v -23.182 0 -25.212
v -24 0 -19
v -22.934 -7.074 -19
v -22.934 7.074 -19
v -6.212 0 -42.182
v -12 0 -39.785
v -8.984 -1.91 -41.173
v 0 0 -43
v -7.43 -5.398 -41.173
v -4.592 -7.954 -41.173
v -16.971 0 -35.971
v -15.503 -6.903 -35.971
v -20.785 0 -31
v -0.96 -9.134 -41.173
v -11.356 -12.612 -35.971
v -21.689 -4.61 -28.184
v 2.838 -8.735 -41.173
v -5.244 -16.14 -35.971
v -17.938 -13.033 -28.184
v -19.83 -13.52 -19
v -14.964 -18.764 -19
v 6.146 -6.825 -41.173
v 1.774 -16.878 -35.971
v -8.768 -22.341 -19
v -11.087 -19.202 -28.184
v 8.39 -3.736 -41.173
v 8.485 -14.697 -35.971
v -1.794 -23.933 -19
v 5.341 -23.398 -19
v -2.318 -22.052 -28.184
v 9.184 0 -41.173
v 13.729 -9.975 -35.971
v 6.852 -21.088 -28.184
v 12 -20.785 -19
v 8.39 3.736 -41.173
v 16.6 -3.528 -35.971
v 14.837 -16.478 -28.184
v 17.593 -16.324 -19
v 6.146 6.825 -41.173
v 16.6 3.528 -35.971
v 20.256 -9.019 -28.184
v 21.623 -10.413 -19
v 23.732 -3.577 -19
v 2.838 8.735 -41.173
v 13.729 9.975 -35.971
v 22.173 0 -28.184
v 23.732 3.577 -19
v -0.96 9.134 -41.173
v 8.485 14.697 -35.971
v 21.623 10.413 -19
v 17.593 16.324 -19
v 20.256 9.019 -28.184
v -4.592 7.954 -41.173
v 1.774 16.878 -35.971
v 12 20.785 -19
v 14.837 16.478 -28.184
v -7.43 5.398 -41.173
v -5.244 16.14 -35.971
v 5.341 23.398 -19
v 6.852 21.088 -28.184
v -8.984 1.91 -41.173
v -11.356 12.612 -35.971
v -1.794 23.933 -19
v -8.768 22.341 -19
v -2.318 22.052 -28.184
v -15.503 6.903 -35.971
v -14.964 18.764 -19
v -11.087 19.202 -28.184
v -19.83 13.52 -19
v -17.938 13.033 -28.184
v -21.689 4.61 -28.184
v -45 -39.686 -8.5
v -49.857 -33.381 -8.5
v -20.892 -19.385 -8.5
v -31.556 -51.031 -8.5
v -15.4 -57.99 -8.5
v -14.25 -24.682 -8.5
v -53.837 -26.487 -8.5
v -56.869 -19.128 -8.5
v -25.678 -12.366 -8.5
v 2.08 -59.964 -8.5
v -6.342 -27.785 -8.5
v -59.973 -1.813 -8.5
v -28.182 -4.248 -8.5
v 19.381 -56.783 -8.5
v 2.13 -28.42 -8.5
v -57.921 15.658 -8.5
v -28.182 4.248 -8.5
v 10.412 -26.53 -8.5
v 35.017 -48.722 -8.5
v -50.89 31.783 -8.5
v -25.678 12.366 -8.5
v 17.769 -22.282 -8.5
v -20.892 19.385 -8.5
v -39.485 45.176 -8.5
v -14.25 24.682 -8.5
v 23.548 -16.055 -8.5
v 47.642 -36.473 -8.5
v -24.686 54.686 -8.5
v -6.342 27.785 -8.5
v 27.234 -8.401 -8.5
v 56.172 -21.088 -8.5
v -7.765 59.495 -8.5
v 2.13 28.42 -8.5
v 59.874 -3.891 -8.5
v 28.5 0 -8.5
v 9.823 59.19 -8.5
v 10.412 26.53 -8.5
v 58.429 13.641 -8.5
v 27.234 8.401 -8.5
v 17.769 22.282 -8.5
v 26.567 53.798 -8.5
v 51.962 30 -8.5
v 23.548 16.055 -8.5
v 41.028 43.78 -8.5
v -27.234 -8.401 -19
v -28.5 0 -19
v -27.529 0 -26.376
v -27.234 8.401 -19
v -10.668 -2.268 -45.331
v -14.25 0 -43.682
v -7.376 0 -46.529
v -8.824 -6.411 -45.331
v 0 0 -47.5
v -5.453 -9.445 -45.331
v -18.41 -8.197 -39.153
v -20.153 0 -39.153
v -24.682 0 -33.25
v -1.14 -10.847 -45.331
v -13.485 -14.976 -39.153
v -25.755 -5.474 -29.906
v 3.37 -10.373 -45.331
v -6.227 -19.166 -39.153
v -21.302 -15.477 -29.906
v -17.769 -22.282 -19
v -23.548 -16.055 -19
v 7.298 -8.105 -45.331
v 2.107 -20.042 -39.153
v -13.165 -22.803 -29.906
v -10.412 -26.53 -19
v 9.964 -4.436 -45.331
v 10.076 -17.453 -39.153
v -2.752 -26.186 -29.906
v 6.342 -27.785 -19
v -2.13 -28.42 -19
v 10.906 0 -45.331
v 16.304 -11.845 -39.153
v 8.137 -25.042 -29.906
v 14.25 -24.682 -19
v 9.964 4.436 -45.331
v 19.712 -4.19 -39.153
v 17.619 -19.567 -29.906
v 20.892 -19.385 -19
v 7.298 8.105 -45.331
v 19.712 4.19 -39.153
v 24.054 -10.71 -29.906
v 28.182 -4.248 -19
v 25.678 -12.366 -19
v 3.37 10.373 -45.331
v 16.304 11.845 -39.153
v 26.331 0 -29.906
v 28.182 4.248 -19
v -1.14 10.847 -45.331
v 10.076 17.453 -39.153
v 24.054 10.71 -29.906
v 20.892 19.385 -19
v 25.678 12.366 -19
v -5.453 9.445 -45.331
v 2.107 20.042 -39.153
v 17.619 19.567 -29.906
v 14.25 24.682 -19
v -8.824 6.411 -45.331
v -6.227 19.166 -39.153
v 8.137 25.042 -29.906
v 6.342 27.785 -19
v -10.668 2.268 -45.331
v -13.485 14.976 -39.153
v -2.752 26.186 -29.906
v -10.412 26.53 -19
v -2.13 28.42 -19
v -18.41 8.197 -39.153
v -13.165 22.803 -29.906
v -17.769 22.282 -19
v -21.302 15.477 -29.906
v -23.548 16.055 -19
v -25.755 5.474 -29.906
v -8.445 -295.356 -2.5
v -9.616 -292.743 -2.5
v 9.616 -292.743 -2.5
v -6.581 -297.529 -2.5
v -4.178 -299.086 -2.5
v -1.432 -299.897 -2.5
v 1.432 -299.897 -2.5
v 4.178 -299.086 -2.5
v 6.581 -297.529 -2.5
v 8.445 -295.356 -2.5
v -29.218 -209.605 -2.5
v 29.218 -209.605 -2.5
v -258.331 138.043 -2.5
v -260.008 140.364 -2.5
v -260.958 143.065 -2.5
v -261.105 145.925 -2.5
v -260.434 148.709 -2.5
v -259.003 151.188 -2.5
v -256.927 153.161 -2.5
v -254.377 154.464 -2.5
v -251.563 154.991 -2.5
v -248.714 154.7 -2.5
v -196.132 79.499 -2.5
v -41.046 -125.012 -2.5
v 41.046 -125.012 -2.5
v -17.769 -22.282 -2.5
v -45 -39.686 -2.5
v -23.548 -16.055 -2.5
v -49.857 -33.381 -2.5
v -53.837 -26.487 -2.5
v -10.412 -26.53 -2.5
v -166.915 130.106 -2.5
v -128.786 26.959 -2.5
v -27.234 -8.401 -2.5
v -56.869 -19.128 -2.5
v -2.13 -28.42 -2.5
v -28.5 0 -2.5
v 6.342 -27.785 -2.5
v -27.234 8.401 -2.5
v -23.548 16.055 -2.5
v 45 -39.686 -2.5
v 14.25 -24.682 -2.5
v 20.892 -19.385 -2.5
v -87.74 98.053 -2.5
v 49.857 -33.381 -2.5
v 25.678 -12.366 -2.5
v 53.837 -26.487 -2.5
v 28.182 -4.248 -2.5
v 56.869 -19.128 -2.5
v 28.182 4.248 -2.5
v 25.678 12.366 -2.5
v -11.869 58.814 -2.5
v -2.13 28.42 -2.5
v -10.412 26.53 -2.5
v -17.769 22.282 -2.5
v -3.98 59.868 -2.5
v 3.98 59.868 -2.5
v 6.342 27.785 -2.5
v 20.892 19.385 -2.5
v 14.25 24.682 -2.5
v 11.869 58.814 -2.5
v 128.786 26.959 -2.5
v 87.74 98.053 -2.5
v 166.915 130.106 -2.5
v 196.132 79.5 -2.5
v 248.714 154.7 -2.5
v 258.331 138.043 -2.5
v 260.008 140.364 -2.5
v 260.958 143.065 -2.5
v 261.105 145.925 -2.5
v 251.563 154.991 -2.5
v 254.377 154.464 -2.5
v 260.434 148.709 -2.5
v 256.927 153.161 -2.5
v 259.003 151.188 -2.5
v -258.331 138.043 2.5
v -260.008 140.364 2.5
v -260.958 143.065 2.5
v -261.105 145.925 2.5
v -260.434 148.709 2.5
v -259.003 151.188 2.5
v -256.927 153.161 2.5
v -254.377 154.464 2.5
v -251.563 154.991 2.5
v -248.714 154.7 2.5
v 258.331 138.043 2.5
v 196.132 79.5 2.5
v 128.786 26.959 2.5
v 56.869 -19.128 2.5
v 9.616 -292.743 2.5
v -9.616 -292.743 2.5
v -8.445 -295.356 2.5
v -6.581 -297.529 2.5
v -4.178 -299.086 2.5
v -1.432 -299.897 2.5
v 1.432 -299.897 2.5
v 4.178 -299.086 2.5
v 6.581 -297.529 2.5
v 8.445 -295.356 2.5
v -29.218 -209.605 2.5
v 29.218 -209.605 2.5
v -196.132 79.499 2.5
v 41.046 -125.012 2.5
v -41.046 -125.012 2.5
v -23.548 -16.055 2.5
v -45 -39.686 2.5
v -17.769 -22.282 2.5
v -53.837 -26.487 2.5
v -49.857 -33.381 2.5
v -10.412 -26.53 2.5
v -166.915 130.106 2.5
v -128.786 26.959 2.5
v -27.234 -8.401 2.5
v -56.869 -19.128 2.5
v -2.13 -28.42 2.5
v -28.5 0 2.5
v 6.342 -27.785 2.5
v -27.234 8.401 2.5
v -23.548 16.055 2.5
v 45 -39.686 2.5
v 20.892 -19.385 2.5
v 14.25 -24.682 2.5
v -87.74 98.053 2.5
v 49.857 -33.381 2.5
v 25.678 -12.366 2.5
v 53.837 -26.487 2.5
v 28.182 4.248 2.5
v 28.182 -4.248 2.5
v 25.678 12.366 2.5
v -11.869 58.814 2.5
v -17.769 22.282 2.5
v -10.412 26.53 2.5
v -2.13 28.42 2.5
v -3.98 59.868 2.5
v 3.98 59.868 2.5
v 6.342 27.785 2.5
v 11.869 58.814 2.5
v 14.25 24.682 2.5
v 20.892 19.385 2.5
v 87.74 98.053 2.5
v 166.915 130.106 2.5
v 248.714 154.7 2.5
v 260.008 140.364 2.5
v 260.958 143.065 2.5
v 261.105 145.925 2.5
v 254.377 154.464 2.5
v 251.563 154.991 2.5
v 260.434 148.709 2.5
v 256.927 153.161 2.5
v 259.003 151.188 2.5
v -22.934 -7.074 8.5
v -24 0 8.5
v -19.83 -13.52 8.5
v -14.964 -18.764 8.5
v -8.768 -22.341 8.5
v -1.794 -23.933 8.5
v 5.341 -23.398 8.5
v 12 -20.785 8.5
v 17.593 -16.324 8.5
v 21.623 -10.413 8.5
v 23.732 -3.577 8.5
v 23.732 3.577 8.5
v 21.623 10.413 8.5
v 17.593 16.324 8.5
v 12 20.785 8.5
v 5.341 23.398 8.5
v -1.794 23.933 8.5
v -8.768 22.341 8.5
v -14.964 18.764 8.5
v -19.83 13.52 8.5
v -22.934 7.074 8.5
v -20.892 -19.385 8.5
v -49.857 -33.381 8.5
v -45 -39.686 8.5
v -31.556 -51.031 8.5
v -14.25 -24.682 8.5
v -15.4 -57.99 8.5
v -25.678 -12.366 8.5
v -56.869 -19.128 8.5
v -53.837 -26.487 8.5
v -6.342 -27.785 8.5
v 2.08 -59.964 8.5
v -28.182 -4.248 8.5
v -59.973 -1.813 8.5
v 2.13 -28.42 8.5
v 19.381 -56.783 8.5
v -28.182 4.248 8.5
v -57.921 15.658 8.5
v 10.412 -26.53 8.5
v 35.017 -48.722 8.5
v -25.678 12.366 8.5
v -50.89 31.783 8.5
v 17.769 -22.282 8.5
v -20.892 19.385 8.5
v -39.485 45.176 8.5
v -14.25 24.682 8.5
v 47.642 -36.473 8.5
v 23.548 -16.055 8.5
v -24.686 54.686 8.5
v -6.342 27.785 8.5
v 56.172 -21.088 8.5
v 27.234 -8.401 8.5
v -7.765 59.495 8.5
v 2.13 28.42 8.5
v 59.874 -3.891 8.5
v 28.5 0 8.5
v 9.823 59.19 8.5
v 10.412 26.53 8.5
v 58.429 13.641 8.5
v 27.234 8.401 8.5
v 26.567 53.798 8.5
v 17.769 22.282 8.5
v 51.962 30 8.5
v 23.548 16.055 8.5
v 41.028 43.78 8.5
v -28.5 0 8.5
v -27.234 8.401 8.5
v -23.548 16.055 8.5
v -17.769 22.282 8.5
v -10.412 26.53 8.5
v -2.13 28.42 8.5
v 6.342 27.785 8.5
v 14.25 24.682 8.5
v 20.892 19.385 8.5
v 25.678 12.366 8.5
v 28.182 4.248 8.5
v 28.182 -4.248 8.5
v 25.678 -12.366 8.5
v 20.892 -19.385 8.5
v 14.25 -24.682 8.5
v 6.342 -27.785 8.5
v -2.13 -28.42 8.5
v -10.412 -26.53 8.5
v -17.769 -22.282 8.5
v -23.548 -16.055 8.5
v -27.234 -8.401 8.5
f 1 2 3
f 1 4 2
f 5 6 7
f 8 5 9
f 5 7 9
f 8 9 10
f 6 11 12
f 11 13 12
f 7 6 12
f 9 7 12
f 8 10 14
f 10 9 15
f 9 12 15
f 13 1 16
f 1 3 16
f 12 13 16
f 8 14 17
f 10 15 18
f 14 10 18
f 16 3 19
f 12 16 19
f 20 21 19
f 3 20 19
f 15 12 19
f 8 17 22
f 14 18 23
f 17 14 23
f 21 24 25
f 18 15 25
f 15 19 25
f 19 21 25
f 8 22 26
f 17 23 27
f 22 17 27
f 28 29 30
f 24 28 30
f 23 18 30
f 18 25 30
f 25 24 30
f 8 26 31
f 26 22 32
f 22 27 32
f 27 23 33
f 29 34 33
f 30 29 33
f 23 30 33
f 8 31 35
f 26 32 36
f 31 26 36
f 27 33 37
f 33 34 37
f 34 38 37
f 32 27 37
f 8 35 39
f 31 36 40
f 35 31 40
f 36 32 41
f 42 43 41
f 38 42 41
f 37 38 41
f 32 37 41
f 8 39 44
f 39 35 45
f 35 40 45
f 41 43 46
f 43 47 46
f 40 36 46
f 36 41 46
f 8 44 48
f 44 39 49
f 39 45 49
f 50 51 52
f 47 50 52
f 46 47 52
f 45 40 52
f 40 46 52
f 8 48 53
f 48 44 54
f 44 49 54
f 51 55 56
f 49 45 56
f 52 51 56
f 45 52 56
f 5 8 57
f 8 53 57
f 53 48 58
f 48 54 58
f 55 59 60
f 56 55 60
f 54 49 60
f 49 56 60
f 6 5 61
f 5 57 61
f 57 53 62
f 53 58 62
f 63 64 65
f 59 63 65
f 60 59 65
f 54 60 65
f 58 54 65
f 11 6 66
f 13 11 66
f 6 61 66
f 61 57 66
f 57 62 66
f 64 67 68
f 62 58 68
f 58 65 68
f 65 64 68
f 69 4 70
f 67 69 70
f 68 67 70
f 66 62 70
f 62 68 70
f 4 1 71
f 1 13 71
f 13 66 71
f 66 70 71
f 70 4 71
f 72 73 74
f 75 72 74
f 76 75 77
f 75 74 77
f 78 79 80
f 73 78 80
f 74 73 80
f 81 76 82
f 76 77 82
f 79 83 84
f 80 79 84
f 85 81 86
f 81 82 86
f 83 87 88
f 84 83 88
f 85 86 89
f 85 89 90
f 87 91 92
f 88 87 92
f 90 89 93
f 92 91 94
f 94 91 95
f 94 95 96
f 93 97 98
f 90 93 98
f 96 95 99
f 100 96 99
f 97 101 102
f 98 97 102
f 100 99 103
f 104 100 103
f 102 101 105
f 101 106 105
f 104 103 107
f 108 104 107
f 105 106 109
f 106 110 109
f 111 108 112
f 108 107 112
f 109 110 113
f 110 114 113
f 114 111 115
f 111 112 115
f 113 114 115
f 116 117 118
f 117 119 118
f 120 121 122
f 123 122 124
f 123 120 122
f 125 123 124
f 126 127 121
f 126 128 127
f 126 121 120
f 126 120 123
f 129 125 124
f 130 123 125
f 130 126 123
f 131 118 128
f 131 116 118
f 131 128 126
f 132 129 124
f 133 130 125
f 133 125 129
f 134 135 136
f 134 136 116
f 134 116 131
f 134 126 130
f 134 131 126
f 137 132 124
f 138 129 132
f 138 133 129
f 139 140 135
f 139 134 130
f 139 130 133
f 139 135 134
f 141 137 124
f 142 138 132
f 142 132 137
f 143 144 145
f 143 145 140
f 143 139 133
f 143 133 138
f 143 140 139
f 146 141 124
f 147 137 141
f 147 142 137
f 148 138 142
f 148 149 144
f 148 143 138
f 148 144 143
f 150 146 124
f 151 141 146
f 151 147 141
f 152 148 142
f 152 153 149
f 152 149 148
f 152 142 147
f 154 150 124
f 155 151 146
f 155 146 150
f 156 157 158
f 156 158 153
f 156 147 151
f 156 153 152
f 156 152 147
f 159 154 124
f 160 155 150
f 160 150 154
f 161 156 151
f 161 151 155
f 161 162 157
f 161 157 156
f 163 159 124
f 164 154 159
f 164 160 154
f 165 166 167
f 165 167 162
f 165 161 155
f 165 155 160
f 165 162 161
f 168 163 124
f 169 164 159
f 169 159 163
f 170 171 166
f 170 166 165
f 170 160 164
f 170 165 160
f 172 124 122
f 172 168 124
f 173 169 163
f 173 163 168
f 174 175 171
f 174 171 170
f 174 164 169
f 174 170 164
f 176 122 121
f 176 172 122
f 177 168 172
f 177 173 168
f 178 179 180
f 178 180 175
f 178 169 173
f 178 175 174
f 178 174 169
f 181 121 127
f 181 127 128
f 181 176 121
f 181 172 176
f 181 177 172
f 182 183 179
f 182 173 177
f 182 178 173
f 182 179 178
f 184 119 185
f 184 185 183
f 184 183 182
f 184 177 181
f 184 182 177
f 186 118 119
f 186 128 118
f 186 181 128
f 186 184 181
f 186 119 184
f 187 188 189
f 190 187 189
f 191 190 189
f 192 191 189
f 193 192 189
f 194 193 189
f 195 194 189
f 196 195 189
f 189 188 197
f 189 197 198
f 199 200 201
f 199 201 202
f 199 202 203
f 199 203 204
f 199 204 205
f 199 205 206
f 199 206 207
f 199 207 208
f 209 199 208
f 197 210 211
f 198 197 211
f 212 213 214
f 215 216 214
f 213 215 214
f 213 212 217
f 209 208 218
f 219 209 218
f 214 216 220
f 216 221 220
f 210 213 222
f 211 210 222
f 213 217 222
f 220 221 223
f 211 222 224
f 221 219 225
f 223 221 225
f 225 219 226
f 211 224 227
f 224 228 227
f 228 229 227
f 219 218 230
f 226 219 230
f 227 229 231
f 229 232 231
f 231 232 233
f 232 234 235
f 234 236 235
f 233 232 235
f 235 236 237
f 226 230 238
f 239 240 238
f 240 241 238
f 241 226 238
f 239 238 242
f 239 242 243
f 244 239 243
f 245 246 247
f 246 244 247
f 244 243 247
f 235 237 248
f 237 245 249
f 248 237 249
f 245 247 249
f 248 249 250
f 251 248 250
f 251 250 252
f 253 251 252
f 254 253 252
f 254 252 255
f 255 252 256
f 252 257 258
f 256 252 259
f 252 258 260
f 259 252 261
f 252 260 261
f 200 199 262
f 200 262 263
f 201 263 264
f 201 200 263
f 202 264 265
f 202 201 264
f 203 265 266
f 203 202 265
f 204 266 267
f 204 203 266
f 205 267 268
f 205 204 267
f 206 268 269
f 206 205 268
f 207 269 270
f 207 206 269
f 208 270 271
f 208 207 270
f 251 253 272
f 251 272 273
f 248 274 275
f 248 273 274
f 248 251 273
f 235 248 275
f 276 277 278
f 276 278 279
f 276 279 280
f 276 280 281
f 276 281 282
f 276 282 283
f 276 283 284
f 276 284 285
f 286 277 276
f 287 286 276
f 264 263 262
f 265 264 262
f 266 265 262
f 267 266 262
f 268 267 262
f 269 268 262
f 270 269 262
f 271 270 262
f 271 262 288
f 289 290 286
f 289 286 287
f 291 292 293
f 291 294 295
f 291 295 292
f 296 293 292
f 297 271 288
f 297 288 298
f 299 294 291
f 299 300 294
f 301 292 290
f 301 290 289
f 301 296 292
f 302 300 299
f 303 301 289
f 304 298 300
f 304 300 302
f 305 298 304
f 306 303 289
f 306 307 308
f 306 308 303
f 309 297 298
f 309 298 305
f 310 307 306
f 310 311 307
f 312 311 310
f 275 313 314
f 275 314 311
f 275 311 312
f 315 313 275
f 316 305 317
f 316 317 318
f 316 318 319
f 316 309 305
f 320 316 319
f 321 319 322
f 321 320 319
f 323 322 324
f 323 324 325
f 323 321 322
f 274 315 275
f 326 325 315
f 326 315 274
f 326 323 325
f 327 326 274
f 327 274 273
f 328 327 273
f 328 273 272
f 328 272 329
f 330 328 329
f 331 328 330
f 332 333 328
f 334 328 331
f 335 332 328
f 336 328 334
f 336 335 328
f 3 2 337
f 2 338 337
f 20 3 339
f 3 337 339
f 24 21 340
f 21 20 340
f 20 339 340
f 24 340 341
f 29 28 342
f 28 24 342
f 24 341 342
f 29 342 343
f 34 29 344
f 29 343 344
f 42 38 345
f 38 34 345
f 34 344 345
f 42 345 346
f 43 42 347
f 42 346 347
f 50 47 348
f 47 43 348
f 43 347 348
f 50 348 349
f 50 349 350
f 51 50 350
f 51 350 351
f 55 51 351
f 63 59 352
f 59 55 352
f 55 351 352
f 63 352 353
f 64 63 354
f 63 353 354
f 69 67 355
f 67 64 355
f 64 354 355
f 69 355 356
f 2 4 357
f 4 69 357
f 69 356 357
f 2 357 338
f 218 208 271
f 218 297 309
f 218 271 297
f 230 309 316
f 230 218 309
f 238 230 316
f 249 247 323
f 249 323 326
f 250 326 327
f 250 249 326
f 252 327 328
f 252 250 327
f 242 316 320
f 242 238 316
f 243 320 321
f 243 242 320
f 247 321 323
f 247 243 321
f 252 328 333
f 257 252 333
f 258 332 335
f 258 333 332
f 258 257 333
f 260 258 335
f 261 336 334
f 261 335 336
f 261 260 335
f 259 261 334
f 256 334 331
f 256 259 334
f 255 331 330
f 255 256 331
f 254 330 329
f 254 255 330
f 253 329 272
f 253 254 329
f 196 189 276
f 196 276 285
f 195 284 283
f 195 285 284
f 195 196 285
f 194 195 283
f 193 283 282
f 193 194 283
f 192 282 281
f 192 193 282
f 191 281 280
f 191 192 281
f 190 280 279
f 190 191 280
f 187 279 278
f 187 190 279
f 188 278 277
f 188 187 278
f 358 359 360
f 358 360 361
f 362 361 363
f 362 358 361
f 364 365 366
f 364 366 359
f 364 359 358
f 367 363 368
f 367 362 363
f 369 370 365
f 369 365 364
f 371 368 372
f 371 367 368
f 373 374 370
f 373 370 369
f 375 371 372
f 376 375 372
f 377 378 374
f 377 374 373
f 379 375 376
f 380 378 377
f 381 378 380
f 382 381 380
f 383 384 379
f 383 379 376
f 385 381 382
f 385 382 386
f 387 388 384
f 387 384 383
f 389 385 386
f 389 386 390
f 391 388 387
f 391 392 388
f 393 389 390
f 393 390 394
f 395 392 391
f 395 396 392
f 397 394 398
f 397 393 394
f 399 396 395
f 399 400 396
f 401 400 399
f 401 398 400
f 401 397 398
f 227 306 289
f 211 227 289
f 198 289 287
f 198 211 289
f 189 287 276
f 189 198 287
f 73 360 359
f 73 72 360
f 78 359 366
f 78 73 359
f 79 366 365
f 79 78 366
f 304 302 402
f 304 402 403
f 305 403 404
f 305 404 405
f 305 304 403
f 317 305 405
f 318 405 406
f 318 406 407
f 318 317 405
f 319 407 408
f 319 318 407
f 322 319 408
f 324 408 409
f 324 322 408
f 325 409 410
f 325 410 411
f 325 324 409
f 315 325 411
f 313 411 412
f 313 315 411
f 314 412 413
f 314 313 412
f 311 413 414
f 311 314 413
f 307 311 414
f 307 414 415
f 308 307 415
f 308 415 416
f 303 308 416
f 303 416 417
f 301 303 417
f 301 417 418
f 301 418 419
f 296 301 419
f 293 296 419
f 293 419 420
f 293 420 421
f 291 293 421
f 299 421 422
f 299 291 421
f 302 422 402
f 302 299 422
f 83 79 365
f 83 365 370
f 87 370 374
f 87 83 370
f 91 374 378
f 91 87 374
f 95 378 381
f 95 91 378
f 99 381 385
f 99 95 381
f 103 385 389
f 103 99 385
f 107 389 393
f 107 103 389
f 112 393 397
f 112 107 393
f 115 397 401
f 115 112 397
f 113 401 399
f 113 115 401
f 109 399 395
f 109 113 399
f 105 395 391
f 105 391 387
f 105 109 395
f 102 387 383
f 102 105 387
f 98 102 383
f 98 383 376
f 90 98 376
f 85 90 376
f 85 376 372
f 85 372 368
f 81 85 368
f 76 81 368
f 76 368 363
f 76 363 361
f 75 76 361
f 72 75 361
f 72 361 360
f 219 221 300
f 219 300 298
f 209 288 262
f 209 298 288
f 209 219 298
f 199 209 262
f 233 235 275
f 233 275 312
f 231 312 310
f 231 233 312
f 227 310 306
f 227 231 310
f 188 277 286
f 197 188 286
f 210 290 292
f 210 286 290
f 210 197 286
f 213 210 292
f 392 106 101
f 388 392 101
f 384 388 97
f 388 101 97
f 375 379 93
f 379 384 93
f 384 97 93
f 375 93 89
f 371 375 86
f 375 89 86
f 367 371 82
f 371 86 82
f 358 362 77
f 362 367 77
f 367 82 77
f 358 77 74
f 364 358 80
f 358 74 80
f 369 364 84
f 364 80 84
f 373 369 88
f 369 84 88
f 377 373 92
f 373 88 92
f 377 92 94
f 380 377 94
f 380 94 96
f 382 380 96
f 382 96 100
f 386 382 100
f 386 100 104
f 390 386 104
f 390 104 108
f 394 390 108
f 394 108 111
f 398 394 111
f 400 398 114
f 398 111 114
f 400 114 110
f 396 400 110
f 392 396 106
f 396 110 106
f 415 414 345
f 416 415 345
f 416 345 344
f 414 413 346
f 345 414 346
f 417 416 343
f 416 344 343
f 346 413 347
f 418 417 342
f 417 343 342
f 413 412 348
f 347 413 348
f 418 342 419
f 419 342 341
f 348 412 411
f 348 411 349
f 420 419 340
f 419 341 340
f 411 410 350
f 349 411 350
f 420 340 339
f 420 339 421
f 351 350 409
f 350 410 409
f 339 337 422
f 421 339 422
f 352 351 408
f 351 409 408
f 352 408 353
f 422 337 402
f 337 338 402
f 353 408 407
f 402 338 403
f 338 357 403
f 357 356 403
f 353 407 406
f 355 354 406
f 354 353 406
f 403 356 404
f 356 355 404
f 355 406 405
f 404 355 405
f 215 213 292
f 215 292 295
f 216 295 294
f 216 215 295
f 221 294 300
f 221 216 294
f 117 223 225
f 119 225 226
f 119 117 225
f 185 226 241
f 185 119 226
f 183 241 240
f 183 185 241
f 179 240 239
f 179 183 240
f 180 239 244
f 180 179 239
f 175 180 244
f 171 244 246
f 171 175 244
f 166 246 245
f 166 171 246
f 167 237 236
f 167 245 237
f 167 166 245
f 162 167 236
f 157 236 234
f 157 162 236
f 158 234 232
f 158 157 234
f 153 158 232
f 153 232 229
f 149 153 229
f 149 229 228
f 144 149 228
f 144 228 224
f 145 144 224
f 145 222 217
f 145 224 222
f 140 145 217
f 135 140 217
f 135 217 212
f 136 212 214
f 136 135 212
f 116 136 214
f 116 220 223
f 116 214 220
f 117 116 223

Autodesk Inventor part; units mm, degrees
ref_plane "YZ Plane" through (0, 0, 0) normal (1, 0, 0) x (0, 1, 0)
ref_plane "XZ Plane" through (0, 0, 0) normal (0, 1, 0) x (-1, 0, 0)
ref_plane "XY Plane" through (0, 0, 0) normal (0, 0, 1) x (1, 0, 0)
sketch "スケッチ1" plane through (0, 0, 0) normal (0, 0, 1) x (1, 0, 0)
  circle A0 centre (0, 0) radius 28.5
  circle A1 centre (0, 0) radius 60
  arc A2 (9.6165, -292.7429) -> (45, -39.6863) centre (-877.5991, -39.6863) ccw
  arc A3 (-9.6165, -292.7429) -> (9.6165, -292.7429) centre (0, -290) ccw
  arc A4 (-45, -39.6863) -> (-9.6165, -292.7429) centre (877.5991, -39.6863) ccw
  circle A5 centre (0, 0) radius 300 construction
  line L0 (45, -39.6863) -> (45, -370.5857) construction
  line L1 (45, -370.5857) -> (-45, -370.5857) construction
  line L2 (-45, -370.5857) -> (-45, -39.6863) construction
  circle A6 centre (0, 0) radius 28.5
  circle A7 centre (0, 0) radius 60
  arc A8 (248.7145, 154.6995) -> (11.8693, 58.8143) centre (473.1689, -740.1799) ccw
  arc A9 (258.331, 138.0433) -> (248.7145, 154.6995) centre (251.1474, 145) ccw
  arc A10 (56.8693, -19.128) -> (258.331, 138.0433) centre (-404.4302, 779.8663) ccw
  circle A11 centre (0, 0) radius 28.5
  circle A12 centre (0, 0) radius 60
  arc A13 (-258.331, 138.0433) -> (-56.8693, -19.128) centre (404.4302, 779.8663) ccw
  arc A14 (-248.7145, 154.6995) -> (-258.331, 138.0433) centre (-251.1474, 145) ccw
  arc A15 (-11.8693, 58.8143) -> (-248.7145, 154.6995) centre (-473.1689, -740.1799) ccw
  point P0 (11.8693, 58.8143)
  point P1 (56.8693, -19.128)
  point P2 (-56.8693, -19.128)
  point P3 (-11.8693, 58.8143)
  dimension "d1" = 90
  dimension "d2" = 600
  dimension "d3" = 120
  dimension "d4" = 57
  dimension "d5" = 90
  dimension "d7" = 10
  dimension "d10" = 360
extrude "押し出し1" add sketch "スケッチ1" along normal mid plane 5
sketch "スケッチ3" plane through (0, 0, 0) normal (0, 1, 0) x (-1, 0, 0)
  line L0 (28.5, -2.5) -> (-28.5, -2.5) projected
  line L1 (28.5, 8.5) -> (28.5, -19)
  line L2 (28.5, -19) -> (24, -19)
  line L3 (24, -19) -> (24, 8.5)
  line L4 (24, 8.5) -> (28.5, 8.5)
  line L5 (0, 0) -> (0, -47.5) construction
  arc A0 (0, -47.5) -> (28.5, -19) centre (0, -19) ccw
  arc A1 (0, -43) -> (24, -19) centre (0, -19) ccw
  line L6 (0, -47.5) -> (0, -43)
  line L7 (45, 2.5) -> (9.6165, 2.5) projected
  dimension "d17" = 24
  dimension "d18" = 28.5
  dimension "d19" = 45
  dimension "d24" = 6
revolve "回転1" add sketch "スケッチ3" angle 360 about axis through (0, 0, 0) along (0, 0, -1)
sketch "スケッチ4" plane through (0, 0, 2.5) normal (0, 0, 1) x (1, 0, 0)
  circle A0 centre (0, 0) radius 28.5 projected
  arc A1 (-56.8693, -19.128) -> (-45, -39.6863) centre (0, 0) ccw projected
  circle A2 centre (0, 0) radius 60
extrude "押し出し3" add sketch "スケッチ4" along normal blind 6 and the other way blind 11 separate body
properties part number "Wind Turbine Propeller"
